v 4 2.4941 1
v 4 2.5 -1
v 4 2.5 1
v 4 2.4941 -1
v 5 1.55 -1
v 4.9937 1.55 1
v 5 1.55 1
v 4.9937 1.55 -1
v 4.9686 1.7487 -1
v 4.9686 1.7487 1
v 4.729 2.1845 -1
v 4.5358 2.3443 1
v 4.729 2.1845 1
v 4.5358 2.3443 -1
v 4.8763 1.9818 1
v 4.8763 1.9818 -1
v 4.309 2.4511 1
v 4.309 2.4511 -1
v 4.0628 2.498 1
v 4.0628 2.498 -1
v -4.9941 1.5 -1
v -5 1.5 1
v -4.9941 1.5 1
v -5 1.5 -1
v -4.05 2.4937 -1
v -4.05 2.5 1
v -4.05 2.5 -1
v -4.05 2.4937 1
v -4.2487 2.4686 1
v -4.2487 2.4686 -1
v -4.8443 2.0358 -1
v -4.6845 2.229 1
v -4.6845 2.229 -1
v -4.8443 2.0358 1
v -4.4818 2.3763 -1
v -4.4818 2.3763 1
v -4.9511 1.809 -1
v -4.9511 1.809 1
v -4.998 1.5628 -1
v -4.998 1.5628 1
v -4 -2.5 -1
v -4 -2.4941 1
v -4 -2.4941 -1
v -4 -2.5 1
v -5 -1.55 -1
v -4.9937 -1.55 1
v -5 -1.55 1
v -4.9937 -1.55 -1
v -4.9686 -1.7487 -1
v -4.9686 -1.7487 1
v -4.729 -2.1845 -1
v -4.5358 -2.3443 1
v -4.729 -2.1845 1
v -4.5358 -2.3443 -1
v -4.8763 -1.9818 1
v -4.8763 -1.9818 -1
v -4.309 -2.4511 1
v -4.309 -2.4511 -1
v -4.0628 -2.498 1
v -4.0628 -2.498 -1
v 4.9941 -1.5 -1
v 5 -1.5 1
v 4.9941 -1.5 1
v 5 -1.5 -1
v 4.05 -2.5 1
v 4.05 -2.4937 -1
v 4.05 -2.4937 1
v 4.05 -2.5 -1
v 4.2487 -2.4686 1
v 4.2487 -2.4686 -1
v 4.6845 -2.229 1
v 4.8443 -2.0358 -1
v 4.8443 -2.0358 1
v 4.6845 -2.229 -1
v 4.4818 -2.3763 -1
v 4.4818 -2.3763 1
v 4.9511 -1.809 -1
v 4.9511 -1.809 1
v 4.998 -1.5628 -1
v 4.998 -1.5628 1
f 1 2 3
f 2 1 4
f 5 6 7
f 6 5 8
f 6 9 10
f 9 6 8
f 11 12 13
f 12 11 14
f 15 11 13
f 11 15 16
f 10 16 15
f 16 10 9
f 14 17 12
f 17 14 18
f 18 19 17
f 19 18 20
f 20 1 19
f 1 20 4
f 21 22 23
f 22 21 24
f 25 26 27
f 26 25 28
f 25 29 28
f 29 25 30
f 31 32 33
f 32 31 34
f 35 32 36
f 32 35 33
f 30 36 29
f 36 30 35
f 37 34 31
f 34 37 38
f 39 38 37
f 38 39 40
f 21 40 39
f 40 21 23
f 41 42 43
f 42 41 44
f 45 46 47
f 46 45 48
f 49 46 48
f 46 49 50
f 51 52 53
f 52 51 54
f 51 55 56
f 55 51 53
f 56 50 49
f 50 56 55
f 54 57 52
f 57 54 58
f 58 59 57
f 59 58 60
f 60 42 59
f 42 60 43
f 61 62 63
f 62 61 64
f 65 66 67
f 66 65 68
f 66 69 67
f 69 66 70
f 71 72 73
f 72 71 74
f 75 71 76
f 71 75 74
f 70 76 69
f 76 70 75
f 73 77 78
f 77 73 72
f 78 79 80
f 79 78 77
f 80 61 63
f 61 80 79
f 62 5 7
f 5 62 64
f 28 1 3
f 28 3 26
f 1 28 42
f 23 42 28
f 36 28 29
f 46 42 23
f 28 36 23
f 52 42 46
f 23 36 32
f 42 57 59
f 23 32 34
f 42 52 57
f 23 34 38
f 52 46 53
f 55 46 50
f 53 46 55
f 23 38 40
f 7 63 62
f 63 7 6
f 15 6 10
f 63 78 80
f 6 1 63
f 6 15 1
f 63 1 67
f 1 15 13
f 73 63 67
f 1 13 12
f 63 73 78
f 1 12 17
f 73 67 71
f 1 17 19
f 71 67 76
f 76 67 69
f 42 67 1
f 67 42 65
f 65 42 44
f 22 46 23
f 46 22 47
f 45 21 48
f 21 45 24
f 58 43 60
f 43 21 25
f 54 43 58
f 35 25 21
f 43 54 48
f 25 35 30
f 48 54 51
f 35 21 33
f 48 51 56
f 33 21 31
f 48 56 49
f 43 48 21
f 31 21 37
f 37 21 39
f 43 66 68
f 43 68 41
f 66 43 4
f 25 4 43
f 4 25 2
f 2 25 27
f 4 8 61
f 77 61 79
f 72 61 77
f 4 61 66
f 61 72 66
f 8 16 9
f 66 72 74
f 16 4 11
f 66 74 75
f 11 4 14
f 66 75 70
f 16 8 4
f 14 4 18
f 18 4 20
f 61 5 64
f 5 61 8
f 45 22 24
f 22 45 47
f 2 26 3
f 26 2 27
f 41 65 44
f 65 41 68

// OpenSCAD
/*
http://codeviewer.org/view/code:1b36 
Copyright (C) 2011 Sergio Vilches
This program is free software: you can redistribute it and/or modify it under the terms of the GNU General Public License as published by the Free Software Foundation, either version 3 of the License, or (at your option) any later version.
This program is distributed in the hope that it will be useful, but WITHOUT ANY WARRANTY; without even the implied warranty of MERCHANTABILITY or FITNESS FOR A PARTICULAR PURPOSE. See the GNU General Public License for more details. You should have received a copy of the GNU General Public License along with this program. If not, see <http://www.gnu.org/licenses/>.
Contact: s.vilches.e@gmail.com


    ----------------------------------------------------------- 
                 Round Corners Cube (Extruded)                
      roundCornersCube(x,y,z,r) Where:                        
         - x = Xdir width                                     
         - y = Ydir width                                     
         - z = Height of the cube                             
         - r = Rounding radious                               
                                                              
      Example: roundCornerCube(10,10,2,1);                    
     *Some times it's needed to use F6 to see good results!   
 	 ----------------------------------------------------------- 
*/
// Test it!
roundCornersCube(10,5,2,1);


module createMeniscus(h,radius) // This module creates the shape that needs to be substracted from a cube to make its corners rounded.
difference(){        //This shape is basicly the difference between a quarter of cylinder and a cube
   translate([radius/2+0.1,radius/2+0.1,0]){
      cube([radius+0.2,radius+0.1,h+0.2],center=true);         // All that 0.x numbers are to avoid "ghost boundaries" when substracting
   }

   cylinder(h=h+0.2,r=radius,$fn = 25,center=true);
}


module roundCornersCube(x,y,z,r)  // Now we just substract the shape we have created in the four corners
difference(){
   cube([x,y,z], center=true);

translate([x/2-r,y/2-r]){  // We move to the first corner (x,y)
      rotate(0){  
         createMeniscus(z,r); // And substract the meniscus
      }
   }
   translate([-x/2+r,y/2-r]){ // To the second corner (-x,y)
      rotate(90){
         createMeniscus(z,r); // But this time we have to rotate the meniscus 90 deg
      }
   }
      translate([-x/2+r,-y/2+r]){ // ... 
      rotate(180){
         createMeniscus(z,r);
      }
   }
      translate([x/2-r,-y/2+r]){
      rotate(270){
         createMeniscus(z,r);
      }
   }
}
